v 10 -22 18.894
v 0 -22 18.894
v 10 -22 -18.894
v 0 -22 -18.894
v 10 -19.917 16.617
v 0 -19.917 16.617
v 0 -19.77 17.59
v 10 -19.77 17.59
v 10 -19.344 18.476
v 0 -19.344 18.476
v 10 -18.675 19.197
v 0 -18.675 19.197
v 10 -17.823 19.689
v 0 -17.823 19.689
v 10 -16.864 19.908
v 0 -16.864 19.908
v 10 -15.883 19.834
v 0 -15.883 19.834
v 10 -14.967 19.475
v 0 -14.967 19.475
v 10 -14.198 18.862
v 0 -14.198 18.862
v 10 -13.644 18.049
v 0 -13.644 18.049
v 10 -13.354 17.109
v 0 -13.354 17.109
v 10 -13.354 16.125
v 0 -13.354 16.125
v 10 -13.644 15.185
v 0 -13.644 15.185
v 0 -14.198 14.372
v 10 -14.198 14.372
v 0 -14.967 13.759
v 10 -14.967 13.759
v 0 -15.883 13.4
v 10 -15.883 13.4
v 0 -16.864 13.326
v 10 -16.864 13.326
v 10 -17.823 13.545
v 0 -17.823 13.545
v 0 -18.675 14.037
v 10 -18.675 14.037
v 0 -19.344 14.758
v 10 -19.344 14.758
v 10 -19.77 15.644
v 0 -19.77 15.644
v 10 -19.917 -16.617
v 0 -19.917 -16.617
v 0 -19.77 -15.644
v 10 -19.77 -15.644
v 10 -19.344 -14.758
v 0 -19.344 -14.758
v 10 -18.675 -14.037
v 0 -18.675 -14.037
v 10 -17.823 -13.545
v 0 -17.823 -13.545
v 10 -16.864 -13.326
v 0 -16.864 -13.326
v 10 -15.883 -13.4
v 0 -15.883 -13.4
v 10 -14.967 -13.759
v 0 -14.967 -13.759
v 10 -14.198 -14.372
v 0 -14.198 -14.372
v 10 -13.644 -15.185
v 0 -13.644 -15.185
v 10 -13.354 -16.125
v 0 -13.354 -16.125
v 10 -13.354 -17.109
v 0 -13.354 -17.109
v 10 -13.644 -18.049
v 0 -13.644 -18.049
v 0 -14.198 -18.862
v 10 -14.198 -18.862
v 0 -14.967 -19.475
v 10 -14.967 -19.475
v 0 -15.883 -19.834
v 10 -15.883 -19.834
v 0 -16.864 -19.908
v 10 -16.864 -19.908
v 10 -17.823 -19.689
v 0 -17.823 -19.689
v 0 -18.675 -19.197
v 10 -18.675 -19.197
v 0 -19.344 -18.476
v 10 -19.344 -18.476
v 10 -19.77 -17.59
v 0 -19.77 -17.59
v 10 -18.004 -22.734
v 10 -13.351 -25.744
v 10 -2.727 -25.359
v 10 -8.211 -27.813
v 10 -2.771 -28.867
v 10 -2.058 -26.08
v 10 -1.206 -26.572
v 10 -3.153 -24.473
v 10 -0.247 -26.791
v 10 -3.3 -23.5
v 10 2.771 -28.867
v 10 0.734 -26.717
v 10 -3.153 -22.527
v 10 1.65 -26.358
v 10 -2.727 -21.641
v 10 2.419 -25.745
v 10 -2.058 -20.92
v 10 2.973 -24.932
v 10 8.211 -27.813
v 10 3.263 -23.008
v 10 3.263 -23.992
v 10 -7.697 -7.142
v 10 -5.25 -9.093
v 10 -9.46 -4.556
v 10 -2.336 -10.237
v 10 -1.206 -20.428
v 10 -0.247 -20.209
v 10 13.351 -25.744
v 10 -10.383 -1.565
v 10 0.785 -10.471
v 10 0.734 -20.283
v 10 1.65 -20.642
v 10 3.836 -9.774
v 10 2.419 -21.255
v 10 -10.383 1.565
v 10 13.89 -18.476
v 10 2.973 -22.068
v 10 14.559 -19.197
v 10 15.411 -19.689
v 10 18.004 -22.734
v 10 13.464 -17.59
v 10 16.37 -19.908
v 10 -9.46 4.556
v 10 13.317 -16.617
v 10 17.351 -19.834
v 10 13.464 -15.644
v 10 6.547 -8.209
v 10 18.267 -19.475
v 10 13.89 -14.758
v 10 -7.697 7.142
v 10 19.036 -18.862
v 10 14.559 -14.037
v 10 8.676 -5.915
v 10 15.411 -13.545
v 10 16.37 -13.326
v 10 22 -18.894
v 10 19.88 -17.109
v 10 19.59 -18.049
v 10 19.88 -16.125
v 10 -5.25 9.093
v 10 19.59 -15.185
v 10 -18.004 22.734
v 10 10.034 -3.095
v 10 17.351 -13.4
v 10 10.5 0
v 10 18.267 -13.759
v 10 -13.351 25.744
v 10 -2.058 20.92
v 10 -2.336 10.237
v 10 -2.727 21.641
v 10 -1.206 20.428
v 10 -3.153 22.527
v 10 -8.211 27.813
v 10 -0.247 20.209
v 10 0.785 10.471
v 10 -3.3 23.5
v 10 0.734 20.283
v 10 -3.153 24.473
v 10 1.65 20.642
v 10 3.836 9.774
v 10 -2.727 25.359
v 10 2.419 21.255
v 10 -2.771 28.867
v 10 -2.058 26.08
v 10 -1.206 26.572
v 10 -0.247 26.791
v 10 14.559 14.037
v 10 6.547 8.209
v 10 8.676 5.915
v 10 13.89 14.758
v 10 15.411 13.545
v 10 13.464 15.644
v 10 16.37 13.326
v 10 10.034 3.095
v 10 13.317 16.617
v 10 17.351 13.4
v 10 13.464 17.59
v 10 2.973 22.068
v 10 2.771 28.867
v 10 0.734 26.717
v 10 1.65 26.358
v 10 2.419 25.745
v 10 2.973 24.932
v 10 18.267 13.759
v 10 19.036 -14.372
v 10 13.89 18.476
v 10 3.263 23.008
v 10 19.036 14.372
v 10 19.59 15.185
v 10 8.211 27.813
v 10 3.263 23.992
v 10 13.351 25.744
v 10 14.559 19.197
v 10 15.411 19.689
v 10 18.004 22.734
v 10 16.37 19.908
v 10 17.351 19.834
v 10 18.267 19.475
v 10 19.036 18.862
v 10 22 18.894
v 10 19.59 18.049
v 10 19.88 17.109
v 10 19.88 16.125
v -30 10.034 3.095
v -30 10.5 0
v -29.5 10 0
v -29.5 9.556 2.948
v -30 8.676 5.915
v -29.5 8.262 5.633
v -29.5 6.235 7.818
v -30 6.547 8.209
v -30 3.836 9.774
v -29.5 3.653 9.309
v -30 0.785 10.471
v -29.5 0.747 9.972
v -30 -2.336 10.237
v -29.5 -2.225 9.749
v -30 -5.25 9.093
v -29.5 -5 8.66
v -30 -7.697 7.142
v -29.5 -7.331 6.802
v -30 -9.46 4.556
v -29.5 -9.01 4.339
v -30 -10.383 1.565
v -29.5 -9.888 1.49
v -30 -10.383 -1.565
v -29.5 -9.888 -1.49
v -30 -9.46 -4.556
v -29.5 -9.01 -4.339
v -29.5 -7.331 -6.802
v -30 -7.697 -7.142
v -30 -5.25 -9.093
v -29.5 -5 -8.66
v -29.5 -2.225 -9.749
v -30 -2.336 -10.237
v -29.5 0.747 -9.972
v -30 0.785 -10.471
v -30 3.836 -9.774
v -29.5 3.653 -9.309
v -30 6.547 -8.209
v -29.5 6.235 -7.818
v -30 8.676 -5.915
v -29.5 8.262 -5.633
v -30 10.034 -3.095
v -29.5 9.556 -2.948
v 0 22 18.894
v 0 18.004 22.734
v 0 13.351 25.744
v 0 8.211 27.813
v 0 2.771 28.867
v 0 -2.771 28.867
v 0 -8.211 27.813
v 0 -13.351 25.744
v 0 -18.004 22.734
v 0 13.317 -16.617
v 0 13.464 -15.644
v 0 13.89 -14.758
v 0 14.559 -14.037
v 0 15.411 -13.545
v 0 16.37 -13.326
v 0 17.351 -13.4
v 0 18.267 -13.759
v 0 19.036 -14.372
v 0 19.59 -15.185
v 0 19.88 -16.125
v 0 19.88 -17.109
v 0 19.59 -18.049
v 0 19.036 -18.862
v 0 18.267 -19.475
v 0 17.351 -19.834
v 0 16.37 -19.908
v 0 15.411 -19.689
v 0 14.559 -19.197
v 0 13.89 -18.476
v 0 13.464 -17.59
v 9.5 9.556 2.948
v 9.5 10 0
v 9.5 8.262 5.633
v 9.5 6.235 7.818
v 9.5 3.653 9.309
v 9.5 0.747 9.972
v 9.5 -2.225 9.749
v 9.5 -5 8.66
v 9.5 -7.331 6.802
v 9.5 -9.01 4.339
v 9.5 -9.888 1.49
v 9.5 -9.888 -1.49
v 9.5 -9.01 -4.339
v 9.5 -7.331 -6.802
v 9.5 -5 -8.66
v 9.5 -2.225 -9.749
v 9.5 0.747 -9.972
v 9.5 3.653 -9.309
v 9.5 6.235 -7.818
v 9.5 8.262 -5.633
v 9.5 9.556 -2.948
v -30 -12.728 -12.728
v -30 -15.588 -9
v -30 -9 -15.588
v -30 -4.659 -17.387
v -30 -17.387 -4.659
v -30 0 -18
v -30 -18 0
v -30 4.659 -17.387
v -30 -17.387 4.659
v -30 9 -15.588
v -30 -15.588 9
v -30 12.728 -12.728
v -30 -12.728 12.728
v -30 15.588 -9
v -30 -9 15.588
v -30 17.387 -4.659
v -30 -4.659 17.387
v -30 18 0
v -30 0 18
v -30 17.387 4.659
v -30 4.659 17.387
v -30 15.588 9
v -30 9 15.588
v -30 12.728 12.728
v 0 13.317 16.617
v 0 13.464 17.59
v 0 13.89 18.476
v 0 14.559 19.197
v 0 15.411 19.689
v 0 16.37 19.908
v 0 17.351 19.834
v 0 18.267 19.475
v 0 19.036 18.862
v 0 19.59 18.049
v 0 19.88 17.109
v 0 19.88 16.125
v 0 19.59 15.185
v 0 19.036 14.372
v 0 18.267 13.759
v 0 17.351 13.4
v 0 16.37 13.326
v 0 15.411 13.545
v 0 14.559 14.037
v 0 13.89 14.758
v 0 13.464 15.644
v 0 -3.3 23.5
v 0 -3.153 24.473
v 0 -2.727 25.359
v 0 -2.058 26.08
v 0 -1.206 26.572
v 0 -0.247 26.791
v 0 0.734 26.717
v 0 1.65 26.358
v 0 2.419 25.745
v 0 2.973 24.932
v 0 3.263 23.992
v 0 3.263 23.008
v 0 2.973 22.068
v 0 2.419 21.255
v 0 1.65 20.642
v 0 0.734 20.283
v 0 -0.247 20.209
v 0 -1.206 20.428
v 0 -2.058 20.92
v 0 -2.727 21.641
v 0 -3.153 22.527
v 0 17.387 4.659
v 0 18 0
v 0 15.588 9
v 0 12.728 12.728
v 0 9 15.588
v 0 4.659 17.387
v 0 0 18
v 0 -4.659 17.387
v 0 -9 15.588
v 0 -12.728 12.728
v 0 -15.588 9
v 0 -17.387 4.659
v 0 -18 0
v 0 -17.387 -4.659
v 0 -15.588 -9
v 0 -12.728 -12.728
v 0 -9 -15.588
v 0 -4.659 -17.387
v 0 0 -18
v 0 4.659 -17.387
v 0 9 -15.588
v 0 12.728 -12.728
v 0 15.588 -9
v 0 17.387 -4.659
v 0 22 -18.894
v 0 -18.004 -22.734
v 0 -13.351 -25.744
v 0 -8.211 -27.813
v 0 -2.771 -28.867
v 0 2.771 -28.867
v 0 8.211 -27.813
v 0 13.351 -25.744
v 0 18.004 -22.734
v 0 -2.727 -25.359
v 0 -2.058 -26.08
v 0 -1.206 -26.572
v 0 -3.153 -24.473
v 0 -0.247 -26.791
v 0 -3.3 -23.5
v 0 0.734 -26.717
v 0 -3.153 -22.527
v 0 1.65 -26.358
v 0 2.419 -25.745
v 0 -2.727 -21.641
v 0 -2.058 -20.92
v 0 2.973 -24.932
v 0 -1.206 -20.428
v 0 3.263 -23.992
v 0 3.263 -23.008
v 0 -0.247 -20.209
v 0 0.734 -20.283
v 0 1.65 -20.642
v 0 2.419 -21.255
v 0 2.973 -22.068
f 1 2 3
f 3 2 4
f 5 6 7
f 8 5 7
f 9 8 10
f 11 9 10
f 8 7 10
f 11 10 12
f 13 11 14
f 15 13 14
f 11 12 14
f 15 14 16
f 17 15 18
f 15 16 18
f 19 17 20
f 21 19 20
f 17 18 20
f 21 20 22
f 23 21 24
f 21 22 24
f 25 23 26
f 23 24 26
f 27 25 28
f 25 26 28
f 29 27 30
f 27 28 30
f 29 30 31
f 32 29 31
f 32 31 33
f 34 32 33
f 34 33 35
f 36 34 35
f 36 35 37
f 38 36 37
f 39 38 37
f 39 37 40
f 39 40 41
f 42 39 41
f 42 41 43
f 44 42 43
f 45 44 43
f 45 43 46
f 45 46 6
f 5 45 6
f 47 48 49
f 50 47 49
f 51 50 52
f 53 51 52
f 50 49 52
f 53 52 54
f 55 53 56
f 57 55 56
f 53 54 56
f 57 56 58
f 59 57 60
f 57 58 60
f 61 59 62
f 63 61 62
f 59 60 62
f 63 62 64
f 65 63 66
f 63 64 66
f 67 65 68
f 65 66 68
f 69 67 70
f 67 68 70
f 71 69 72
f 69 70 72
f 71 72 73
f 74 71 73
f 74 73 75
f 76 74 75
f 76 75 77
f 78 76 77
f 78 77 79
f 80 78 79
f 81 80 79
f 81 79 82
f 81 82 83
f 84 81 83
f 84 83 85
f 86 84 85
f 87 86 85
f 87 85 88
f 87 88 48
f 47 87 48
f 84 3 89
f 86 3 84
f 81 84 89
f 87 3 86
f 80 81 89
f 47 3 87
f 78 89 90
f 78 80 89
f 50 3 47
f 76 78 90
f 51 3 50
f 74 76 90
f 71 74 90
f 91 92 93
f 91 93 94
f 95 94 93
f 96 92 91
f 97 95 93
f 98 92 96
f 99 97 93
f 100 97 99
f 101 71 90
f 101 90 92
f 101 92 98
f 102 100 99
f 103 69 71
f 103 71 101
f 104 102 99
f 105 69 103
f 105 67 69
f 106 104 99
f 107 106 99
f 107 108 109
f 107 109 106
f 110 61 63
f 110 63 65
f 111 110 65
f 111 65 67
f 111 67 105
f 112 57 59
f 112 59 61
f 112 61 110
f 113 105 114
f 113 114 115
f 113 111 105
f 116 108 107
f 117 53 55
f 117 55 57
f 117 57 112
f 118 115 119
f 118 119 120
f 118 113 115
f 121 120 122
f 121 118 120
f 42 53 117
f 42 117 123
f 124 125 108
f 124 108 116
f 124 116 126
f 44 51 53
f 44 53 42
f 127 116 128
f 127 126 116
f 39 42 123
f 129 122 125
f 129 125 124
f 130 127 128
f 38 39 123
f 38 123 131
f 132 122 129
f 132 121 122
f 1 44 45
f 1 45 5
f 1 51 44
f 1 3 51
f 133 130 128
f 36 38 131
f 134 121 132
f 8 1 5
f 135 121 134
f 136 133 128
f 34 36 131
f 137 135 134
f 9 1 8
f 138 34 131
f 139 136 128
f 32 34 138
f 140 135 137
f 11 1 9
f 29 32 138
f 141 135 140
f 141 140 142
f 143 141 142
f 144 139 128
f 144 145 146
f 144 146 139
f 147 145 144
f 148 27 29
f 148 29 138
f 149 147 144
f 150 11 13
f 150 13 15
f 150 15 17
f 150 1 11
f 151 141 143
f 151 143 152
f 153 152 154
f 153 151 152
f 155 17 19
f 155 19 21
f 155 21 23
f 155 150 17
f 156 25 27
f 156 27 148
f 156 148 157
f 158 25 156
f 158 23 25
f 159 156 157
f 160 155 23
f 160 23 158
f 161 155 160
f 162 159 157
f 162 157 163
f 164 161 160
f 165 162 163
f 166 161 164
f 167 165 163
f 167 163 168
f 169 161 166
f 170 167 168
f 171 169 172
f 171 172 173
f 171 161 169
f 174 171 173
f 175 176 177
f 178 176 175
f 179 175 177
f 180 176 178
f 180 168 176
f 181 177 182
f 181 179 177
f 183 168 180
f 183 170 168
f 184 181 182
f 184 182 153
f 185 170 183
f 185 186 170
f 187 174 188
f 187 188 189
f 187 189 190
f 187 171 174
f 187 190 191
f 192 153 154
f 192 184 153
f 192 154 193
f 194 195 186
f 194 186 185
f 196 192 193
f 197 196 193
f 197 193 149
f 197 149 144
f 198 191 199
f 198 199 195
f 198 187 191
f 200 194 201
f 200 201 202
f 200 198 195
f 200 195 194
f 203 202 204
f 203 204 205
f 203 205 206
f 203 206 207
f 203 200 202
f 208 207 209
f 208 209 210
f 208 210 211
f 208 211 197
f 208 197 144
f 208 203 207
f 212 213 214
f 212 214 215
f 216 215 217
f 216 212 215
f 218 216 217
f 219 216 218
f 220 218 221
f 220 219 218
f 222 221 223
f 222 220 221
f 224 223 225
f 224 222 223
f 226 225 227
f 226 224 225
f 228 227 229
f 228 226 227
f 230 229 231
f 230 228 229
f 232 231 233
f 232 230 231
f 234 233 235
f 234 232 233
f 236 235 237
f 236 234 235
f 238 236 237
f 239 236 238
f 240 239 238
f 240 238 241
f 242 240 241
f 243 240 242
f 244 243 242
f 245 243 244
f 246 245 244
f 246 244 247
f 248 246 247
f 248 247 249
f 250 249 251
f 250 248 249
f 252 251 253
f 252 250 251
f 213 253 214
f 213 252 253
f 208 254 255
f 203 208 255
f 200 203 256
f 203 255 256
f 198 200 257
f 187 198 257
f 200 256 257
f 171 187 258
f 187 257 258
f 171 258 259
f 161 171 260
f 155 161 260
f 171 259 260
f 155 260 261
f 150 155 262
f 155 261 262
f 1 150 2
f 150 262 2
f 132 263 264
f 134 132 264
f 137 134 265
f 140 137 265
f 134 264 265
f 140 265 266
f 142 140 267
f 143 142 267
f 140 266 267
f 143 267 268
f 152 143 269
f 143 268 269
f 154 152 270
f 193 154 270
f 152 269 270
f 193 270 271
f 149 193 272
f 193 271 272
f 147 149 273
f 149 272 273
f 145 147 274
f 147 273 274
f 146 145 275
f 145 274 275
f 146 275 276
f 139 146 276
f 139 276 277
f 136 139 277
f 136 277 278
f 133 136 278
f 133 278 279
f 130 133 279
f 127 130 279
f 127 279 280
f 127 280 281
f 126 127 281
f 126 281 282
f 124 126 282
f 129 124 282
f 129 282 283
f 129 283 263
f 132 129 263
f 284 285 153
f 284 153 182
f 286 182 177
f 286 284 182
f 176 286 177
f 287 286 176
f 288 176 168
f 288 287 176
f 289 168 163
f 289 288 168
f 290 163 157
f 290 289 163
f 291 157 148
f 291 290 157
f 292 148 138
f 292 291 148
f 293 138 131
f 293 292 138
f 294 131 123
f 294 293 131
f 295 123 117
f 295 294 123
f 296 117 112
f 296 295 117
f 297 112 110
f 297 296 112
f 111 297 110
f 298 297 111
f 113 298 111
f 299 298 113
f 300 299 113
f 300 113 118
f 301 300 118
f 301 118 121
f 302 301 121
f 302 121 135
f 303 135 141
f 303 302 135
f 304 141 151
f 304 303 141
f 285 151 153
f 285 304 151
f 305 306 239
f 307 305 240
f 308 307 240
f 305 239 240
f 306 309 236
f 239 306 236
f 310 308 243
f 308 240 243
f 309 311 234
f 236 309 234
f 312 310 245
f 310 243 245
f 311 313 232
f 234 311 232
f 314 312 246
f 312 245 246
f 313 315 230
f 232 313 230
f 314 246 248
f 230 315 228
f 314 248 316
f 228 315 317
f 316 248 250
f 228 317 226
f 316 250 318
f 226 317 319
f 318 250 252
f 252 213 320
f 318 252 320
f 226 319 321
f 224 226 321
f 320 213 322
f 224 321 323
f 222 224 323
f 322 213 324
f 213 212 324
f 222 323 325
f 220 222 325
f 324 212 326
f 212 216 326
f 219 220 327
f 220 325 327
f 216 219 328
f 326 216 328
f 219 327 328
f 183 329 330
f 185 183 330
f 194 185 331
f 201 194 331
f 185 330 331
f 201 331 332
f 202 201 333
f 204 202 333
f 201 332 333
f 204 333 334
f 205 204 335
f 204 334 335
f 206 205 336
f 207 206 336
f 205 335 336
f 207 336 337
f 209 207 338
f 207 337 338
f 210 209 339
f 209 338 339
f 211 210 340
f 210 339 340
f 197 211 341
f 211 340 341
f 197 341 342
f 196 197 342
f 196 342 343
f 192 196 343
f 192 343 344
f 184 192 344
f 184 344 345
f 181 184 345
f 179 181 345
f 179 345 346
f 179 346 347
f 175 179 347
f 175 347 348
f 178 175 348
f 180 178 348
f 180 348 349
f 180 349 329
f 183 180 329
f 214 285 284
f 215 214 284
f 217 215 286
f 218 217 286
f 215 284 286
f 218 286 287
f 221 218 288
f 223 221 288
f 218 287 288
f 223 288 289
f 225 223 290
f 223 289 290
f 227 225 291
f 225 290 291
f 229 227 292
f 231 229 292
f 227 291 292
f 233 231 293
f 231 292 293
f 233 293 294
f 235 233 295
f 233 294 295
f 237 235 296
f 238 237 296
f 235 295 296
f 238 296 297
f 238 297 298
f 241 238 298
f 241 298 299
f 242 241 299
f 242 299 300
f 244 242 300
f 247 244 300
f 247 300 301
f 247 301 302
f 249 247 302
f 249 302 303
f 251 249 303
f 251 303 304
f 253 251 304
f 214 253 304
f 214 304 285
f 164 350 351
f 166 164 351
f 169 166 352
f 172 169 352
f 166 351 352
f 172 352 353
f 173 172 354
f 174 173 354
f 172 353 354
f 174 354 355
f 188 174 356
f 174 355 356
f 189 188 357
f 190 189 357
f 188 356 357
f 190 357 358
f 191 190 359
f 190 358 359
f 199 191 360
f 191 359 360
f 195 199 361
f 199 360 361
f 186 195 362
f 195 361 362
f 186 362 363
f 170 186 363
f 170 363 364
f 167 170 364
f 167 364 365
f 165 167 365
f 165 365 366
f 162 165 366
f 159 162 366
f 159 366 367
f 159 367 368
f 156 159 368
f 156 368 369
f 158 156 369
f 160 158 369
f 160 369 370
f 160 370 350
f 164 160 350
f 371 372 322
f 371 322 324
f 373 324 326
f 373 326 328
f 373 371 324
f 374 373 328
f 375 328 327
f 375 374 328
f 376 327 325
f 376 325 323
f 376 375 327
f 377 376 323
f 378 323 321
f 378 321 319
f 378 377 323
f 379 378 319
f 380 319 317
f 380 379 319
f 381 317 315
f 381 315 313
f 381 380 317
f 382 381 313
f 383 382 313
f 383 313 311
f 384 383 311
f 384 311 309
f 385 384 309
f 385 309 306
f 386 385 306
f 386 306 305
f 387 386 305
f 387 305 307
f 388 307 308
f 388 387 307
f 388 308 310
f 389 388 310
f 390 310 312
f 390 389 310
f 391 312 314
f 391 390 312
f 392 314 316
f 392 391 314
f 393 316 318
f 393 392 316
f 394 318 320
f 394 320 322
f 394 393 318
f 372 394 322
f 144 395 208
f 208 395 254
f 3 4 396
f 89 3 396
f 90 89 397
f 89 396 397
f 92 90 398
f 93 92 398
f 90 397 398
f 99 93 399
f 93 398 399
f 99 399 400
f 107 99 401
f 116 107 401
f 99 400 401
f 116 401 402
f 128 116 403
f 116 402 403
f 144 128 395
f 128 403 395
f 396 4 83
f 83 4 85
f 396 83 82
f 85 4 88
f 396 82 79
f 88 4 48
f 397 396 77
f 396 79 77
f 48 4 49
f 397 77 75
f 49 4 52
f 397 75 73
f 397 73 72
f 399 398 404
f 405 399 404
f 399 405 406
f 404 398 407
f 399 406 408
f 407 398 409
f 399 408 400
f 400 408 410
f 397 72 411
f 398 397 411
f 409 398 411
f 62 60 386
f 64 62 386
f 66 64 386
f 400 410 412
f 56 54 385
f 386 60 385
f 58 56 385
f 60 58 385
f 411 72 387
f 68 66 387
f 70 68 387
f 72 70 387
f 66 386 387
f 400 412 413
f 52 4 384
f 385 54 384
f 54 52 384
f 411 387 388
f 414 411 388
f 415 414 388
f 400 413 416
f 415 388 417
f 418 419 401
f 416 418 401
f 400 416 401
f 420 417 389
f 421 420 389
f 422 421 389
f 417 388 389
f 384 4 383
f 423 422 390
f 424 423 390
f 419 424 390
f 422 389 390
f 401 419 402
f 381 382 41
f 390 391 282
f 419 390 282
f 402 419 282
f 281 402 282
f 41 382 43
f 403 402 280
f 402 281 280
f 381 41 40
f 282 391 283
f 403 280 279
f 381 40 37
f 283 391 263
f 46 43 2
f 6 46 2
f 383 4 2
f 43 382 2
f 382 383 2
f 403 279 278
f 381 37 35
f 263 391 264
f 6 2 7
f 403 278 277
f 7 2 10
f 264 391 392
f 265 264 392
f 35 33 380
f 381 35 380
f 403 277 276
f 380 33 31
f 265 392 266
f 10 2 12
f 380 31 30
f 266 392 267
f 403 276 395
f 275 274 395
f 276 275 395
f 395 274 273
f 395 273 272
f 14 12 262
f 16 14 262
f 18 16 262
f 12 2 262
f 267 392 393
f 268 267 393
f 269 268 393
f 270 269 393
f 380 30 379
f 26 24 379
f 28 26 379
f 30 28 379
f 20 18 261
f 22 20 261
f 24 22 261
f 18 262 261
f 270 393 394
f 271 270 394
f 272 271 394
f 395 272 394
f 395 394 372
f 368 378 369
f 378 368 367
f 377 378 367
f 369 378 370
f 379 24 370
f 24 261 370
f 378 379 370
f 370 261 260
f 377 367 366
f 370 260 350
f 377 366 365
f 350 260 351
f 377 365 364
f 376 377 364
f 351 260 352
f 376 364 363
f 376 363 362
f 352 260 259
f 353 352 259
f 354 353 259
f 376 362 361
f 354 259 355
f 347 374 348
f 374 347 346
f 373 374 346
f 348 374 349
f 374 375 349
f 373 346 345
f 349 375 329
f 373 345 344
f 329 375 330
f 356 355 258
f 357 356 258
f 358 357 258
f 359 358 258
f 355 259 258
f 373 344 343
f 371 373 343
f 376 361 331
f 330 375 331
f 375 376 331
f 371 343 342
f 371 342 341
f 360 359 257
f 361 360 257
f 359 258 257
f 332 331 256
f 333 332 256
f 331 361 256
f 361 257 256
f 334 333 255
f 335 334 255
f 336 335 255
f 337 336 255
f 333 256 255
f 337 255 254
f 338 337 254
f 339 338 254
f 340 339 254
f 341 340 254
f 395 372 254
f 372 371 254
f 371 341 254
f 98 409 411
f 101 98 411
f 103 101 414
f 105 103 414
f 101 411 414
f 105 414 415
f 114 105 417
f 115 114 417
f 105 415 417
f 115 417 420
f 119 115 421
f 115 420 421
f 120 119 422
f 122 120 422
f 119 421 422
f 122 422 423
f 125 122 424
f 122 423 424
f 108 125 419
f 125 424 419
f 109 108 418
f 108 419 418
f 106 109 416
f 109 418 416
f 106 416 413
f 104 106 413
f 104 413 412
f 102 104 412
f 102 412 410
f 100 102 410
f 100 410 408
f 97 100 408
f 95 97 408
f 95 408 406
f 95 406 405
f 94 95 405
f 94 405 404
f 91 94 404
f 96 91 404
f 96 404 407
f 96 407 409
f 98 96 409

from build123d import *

# Parameters (mm, degrees)
F0_R     = 18
F1_DEPTH = 30
F3_DEPTH = 10
F4_R     = 10
F5_DEPTH = 40.001
F6_SIZE  = 0.5
F8_D     = 6.6


with BuildPart() as f1:
    # F0 (on Right) → F1 (new body)
    with BuildSketch(Plane.YZ):
        Circle(F0_R)
    extrude(amount=-F1_DEPTH)

    # F2 (on face) → F3 (join)
    with BuildSketch(Plane.YZ):
        with BuildLine():
            Line((-22, 18.8944436277), (-22, -18.8944436277))
            ThreePointArc((-22, -18.8944436277), (0, -29), (22, -18.8944436277))
            Line((22, -18.8944436277), (22, 18.8944436277))
            ThreePointArc((22, 18.8944436277), (0, 29), (-22, 18.8944436277))
        make_face()
    extrude(amount=F3_DEPTH)

    # F4 (on face) → F5 (cut, through all)
    with BuildSketch(Plane.YZ.offset(10)):
        Circle(F4_R)
    extrude(amount=-F5_DEPTH, mode=Mode.SUBTRACT)

    # F6
    f6_edges = [f1.edges().sort_by_distance(p)[0] for p in [
        (10, -10, 0),
        (-30, -10, 0),
    ]]
    chamfer(f6_edges, length=F6_SIZE)

    # F8 (through all)
    with Locations(Plane.YZ.offset(10)):
        with Locations((0, 23.5), (16.617, 16.617), (16.617, -16.617), (0, -23.5), (-16.617, -16.617), (-16.617, 16.617)):
            Hole(F8_D / 2)


solid = f1.part
